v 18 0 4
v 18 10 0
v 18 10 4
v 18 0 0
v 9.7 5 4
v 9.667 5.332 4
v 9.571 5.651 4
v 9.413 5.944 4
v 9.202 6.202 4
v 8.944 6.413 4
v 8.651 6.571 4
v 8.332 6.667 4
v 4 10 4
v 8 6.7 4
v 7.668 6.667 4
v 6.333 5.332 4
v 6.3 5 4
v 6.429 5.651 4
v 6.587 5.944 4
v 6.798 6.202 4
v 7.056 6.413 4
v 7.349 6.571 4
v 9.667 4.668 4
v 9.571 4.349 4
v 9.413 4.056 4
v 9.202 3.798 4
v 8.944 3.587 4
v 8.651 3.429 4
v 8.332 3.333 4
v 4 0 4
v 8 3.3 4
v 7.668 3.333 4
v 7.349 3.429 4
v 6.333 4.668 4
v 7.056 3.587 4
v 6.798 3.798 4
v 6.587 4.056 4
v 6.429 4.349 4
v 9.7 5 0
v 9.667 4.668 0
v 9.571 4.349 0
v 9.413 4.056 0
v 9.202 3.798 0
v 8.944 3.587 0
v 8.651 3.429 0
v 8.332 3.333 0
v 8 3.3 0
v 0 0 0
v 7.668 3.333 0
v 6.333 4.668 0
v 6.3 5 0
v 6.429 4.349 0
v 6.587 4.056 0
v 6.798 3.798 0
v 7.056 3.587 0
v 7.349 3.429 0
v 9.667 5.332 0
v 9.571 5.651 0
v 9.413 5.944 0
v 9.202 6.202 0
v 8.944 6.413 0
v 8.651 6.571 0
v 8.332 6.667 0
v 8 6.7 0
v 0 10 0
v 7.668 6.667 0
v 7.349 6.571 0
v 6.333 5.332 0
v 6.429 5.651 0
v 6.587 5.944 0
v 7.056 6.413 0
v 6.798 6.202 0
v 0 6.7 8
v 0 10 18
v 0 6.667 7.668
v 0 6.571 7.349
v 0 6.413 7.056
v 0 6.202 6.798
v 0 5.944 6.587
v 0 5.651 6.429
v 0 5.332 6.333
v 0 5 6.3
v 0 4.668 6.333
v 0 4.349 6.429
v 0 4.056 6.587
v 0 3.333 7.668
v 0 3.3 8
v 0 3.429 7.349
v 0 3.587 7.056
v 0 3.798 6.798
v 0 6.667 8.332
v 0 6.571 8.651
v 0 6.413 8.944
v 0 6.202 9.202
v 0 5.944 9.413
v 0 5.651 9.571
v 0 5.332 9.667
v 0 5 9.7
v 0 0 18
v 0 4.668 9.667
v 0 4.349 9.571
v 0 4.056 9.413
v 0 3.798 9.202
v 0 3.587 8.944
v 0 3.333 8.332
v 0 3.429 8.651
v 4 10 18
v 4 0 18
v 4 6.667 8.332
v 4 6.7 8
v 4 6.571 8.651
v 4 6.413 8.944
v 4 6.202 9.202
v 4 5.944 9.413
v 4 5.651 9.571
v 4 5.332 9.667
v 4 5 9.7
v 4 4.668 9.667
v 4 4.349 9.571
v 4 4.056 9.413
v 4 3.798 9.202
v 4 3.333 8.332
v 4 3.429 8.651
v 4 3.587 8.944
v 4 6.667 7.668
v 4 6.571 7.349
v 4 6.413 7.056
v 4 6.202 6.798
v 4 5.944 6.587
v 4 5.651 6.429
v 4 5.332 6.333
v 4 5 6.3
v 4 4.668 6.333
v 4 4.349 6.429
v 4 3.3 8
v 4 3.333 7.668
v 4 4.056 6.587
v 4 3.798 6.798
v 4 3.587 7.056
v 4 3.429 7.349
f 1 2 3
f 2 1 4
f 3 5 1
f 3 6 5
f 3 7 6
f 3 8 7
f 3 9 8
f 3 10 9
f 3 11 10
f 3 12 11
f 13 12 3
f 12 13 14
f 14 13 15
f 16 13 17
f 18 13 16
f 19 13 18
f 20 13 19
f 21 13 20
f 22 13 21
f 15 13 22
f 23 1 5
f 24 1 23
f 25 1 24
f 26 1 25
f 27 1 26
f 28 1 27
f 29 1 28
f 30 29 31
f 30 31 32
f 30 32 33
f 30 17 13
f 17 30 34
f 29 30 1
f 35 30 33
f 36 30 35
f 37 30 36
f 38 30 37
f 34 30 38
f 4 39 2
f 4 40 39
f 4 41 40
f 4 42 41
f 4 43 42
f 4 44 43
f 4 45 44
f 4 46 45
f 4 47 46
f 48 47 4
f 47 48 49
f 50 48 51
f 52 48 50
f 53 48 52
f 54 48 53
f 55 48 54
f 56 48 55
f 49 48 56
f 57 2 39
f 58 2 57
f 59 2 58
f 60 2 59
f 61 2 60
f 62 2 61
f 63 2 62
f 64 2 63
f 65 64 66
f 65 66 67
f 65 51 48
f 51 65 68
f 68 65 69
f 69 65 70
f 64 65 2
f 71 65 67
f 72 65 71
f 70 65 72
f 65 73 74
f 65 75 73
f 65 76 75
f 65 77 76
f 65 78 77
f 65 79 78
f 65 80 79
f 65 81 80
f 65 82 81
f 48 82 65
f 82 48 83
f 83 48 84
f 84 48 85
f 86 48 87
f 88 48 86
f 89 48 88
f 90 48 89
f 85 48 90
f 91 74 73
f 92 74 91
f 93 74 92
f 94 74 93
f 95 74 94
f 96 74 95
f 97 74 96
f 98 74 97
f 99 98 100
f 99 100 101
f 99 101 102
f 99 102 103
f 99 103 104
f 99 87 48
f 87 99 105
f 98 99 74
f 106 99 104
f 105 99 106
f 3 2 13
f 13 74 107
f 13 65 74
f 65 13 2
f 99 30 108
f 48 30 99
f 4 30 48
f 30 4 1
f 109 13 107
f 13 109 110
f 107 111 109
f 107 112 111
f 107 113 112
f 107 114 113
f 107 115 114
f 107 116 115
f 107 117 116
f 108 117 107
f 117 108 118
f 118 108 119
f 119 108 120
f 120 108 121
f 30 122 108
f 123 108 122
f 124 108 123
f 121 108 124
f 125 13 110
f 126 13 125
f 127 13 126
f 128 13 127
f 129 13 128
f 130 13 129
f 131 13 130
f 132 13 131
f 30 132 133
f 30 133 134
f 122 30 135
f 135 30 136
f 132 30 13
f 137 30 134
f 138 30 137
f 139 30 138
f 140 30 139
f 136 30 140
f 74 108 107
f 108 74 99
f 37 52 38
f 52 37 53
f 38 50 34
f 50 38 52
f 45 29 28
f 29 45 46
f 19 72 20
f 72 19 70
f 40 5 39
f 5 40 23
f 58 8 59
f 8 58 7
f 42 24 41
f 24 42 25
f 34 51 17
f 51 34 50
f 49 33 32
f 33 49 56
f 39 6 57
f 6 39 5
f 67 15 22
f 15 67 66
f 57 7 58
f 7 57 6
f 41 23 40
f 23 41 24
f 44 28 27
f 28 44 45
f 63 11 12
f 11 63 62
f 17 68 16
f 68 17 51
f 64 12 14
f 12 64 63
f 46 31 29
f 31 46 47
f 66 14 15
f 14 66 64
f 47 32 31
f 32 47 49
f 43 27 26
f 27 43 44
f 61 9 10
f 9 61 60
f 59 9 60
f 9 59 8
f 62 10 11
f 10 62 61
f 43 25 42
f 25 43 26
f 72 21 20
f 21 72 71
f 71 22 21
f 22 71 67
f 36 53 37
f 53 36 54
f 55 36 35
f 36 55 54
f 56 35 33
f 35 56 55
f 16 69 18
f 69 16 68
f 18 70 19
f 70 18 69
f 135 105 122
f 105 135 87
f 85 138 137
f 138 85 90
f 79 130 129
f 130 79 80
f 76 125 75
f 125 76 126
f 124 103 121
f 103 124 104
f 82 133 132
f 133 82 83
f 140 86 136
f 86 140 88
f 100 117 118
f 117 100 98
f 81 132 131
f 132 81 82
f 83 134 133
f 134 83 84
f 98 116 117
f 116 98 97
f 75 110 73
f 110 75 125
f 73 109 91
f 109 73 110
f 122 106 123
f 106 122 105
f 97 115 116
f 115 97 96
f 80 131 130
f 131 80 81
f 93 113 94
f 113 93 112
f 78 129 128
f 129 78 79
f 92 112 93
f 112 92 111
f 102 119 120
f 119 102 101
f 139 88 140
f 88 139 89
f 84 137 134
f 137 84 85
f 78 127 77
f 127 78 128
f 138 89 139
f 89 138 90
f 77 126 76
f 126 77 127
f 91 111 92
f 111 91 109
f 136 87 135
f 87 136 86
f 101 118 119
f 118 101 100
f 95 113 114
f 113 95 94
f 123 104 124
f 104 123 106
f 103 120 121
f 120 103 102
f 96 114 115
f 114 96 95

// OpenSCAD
// escaire_caixa.scad
// Escaire d'angle per unir, sense encolar, dues plaques de DM de 3 mm en
// angle recte (caixa de la mascota T1: base + 4 laterals + tapa). Cada ala
// te un forat M3 que coincideix amb els forats de cantonada de
// Recursos/plantilles_laser/mascota.svg (a 8 mm del caire, funcio
// "_forats_escaire" del generador).
// Material recomanat: PLA. 8 unitats per mascota (6 caixa + 2 tapa).

// --- Parametres (mm) ---
llargada_ala = 18;    // llargada de cada ala: cobreix el forat a 8 mm del caire
amplada_ala = 10;     // amplada de l'escaire
gruix_peca = 4;       // gruix del material impres
forat_m3 = 3.4;       // diametre del forat (M3 amb marge d'impressio)
vora_forat = 8;        // distancia del centre del forat al caire (com el SVG)
$fn = 32;

module ala_plana() {
    cube([llargada_ala, amplada_ala, gruix_peca]);
}

module ala_vertical() {
    cube([gruix_peca, amplada_ala, llargada_ala]);
}

module forat_vertical(x) {
    translate([x, amplada_ala / 2, -1])
        cylinder(h = gruix_peca + 2, d = forat_m3);
}

module forat_horitzontal(z) {
    translate([-1, amplada_ala / 2, z])
        rotate([0, 90, 0])
            cylinder(h = gruix_peca + 2, d = forat_m3);
}

module escaire_caixa() {
    difference() {
        union() {
            ala_plana();      // reposa sobre la base/lateral 1 (pla XY)
            ala_vertical();   // s'apuja contra el lateral 2 (pla YZ)
        }
        forat_vertical(vora_forat);
        forat_horitzontal(vora_forat);
    }
}

escaire_caixa();
